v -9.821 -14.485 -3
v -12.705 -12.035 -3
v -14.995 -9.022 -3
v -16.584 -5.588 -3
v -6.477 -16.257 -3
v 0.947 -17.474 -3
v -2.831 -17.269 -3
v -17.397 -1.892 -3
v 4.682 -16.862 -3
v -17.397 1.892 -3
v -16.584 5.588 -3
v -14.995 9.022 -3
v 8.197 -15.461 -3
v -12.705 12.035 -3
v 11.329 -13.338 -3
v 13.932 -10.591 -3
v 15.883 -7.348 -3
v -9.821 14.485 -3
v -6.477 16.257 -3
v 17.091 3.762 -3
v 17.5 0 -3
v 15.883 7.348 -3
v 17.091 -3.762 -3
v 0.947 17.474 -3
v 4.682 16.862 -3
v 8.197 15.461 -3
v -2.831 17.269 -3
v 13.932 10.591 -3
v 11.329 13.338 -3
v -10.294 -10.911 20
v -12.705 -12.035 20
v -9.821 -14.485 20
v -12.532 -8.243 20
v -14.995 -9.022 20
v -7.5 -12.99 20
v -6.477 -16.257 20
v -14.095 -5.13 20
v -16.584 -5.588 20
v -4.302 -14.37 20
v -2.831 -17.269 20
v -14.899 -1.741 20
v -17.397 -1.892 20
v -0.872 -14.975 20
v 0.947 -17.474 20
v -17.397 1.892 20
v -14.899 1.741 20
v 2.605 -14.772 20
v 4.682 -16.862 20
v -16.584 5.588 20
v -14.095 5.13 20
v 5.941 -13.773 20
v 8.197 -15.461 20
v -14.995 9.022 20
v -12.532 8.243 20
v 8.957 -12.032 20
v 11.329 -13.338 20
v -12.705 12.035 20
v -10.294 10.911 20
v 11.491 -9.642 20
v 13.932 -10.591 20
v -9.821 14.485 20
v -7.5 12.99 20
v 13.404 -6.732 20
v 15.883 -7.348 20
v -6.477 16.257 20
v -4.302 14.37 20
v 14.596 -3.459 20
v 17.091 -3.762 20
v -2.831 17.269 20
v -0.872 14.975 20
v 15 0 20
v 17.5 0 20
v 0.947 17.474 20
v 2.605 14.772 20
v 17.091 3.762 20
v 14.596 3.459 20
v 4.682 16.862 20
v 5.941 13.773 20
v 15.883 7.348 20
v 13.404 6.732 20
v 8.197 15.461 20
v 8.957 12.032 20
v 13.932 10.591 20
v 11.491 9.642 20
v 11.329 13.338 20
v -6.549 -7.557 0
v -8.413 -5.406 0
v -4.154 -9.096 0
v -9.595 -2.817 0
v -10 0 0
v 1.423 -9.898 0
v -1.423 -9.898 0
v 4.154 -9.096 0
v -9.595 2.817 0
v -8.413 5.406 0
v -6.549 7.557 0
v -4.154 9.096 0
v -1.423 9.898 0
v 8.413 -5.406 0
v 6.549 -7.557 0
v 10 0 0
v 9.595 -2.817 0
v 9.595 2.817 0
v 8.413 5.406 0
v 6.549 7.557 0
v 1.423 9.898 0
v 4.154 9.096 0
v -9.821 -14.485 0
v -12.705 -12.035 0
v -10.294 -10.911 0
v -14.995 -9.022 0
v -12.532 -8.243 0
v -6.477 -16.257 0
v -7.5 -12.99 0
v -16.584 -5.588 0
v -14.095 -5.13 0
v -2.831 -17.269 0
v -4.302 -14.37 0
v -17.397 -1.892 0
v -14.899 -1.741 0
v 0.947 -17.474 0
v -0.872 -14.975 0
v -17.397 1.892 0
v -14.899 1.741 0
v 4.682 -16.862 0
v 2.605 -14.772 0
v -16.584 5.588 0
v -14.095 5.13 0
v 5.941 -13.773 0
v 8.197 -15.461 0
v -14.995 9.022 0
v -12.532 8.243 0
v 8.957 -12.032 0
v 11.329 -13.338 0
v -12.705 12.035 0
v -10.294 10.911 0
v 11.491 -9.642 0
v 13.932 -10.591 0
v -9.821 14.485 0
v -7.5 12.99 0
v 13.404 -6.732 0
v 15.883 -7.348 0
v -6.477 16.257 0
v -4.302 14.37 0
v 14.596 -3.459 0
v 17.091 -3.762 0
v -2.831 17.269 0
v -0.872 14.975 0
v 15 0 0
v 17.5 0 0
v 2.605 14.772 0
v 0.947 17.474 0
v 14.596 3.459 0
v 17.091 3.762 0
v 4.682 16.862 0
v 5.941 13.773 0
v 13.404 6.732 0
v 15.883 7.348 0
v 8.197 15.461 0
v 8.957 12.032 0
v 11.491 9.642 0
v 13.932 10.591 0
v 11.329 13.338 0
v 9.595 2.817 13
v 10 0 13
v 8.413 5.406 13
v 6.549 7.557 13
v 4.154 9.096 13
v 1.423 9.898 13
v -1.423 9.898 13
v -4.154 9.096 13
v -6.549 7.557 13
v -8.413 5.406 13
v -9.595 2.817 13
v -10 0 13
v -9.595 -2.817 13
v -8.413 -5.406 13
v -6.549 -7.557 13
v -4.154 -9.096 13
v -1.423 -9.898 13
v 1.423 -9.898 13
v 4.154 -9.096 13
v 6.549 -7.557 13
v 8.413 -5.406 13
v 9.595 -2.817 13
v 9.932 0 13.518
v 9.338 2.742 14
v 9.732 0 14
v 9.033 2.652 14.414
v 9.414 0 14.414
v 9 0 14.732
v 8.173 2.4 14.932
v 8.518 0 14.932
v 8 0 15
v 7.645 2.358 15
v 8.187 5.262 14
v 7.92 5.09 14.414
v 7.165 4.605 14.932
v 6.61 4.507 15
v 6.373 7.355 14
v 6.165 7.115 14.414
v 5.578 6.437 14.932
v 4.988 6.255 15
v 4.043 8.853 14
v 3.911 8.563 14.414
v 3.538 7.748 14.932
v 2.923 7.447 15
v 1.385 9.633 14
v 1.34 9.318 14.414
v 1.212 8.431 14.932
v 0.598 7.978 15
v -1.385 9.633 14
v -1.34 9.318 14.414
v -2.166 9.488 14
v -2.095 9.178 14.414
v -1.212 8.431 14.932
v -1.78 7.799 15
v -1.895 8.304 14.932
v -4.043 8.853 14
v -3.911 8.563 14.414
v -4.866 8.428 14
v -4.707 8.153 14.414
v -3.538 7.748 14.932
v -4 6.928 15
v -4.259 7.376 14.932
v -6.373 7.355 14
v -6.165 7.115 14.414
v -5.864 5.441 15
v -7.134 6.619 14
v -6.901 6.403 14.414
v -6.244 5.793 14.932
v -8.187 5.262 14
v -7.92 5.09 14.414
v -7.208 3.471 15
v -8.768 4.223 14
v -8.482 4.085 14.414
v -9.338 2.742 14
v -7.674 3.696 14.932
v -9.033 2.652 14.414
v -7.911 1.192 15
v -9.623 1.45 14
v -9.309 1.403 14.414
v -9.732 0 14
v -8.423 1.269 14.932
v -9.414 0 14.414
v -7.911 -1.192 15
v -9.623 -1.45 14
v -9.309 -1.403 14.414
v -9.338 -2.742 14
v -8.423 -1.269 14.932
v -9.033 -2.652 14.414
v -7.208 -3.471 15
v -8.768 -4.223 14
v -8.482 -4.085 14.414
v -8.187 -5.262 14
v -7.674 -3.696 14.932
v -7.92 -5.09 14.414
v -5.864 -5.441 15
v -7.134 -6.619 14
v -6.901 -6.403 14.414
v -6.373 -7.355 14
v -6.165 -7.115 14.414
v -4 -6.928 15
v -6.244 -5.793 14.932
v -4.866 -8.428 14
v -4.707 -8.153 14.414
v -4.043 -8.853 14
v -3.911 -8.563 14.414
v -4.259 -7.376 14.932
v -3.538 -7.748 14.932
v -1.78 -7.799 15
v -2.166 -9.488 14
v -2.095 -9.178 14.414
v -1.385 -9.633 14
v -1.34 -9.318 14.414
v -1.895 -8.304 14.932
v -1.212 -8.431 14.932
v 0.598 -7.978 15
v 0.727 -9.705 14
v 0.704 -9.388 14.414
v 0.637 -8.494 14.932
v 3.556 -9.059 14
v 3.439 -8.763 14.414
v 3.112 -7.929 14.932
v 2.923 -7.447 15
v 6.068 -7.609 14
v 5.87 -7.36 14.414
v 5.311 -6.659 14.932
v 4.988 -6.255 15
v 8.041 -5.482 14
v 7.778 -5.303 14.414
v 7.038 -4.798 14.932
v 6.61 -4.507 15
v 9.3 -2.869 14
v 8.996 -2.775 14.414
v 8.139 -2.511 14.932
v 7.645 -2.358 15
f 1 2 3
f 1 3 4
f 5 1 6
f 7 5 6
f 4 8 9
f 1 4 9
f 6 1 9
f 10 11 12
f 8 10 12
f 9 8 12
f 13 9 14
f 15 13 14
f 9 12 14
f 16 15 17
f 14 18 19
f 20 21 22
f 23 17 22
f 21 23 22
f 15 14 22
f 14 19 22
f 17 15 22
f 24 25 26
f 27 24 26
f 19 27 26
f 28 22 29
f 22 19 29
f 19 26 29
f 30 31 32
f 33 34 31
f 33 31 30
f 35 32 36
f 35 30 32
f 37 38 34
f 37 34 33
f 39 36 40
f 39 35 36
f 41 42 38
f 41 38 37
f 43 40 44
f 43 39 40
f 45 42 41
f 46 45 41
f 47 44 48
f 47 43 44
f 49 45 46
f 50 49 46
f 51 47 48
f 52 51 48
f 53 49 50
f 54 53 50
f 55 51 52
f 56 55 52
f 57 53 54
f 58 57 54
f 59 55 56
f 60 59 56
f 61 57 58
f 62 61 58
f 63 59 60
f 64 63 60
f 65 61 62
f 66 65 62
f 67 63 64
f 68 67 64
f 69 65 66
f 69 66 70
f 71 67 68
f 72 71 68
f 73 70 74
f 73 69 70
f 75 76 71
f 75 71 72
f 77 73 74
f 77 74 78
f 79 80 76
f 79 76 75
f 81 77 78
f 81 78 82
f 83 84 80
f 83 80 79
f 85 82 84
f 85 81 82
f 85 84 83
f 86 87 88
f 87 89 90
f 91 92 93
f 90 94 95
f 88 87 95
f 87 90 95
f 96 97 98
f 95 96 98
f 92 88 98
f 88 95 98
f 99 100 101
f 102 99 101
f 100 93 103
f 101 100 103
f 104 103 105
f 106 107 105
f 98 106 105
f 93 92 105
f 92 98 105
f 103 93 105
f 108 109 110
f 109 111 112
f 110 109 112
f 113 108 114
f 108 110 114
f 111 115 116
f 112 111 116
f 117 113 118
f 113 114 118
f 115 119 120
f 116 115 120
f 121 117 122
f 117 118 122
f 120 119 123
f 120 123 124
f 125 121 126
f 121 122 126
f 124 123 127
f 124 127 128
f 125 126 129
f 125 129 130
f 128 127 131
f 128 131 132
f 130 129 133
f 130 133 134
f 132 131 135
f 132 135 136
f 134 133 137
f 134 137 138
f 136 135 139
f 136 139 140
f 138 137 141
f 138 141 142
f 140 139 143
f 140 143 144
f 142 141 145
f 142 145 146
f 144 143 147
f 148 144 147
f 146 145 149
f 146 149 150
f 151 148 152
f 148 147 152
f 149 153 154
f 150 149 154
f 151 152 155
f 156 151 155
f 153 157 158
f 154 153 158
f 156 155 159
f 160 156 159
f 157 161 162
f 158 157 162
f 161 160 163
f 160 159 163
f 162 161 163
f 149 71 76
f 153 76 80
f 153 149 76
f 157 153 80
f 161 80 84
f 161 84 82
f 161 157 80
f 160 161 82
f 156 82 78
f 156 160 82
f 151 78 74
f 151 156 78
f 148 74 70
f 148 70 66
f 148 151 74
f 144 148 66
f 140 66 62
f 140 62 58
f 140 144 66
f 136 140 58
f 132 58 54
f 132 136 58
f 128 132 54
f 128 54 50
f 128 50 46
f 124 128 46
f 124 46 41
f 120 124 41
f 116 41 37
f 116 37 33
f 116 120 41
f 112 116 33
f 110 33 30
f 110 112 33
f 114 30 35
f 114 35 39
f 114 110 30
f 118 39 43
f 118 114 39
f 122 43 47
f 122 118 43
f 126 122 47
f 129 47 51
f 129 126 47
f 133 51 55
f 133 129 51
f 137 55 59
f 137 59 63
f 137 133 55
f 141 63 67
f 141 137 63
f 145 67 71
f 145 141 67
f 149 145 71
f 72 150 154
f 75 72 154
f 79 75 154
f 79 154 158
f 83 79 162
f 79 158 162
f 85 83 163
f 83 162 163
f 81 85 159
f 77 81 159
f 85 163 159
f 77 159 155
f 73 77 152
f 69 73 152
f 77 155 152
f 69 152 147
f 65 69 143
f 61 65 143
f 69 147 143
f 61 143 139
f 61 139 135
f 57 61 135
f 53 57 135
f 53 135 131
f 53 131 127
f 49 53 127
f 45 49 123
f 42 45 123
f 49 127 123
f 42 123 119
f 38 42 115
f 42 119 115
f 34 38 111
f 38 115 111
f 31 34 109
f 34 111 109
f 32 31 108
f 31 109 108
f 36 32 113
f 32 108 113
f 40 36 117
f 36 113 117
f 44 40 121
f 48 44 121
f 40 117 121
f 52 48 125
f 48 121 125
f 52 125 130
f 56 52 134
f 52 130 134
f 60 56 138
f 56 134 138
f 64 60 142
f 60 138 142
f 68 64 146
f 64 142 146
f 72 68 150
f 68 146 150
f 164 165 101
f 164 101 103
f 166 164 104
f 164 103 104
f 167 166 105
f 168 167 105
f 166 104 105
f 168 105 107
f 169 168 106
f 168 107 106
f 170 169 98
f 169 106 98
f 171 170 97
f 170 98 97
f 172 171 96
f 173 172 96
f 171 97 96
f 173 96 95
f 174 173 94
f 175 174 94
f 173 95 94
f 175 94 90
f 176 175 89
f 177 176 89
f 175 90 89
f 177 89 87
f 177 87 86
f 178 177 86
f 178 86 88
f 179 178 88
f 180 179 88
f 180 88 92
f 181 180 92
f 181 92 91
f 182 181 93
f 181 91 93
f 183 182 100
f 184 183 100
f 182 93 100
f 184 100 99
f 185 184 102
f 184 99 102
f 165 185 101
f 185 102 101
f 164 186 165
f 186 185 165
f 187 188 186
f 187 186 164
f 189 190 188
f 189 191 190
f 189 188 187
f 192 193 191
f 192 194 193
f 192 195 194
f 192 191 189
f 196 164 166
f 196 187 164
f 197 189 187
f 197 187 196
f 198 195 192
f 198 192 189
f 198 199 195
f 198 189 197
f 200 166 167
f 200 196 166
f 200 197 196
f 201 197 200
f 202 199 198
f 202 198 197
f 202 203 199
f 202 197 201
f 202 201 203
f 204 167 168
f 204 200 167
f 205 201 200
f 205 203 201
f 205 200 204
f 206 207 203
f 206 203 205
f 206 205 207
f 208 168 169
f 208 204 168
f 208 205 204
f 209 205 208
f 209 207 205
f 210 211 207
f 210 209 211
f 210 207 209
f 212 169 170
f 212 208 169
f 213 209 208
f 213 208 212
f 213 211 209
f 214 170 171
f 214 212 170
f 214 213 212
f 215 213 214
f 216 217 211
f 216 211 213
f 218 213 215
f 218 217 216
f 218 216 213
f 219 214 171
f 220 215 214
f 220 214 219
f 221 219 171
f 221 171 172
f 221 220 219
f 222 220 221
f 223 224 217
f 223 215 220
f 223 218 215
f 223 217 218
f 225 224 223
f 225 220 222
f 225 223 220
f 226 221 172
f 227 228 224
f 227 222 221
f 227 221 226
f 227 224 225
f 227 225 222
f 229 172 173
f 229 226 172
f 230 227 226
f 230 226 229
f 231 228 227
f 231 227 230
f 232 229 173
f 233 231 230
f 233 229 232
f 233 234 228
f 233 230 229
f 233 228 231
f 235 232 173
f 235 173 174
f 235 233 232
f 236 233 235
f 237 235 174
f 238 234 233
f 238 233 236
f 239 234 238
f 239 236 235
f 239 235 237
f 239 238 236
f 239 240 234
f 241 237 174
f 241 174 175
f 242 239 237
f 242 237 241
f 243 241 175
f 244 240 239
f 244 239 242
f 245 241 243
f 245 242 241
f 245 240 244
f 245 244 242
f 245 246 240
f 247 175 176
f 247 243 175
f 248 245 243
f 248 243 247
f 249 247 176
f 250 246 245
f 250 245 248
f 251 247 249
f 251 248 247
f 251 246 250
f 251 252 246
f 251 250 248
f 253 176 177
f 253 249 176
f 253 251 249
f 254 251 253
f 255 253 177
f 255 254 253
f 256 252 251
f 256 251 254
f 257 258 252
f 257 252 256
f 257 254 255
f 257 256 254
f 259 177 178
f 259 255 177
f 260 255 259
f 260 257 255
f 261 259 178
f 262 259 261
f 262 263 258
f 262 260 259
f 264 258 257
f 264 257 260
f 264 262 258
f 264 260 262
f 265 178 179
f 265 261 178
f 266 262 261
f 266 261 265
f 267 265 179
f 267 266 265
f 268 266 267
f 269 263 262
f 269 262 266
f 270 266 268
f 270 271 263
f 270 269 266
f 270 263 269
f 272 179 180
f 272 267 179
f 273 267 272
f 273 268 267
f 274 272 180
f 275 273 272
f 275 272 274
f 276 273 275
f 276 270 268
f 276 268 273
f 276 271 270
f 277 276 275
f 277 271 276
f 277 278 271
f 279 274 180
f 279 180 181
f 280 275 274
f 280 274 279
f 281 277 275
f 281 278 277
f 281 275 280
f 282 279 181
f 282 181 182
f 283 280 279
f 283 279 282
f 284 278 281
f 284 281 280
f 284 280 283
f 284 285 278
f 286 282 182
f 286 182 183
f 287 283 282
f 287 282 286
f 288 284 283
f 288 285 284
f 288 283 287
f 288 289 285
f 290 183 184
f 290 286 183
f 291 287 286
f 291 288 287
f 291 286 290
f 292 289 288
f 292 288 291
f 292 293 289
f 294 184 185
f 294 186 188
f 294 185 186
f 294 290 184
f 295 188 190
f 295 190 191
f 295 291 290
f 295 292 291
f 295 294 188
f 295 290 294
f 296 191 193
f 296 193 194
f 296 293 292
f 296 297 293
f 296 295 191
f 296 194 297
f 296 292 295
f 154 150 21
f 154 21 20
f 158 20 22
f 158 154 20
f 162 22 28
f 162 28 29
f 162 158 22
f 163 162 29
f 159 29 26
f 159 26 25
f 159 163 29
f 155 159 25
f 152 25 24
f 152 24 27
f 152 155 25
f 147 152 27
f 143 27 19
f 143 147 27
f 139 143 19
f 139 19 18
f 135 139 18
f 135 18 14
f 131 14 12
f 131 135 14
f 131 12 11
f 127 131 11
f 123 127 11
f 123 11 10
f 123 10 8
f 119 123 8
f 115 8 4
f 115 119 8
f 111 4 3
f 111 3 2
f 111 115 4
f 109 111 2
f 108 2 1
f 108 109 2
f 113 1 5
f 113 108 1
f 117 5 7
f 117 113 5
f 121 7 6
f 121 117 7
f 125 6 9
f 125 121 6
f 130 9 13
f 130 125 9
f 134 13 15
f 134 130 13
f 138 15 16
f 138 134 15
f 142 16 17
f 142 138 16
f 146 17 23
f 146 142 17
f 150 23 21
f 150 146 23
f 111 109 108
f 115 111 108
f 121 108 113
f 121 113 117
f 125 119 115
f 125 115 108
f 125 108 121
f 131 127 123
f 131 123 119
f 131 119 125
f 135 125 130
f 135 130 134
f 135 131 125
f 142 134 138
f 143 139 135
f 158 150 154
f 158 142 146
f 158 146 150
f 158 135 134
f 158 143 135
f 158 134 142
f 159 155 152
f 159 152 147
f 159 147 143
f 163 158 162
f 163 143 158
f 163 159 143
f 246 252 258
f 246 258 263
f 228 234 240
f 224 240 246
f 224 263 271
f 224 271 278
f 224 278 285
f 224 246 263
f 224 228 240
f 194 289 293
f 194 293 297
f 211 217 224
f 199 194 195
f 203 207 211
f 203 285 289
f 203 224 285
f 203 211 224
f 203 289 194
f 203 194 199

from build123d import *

# Parameters (mm, degrees)
F0_R     = 17.5
F0_R_2   = 15
F1_DEPTH = 20
F2_R     = 10
F3_DEPTH = 15
F4_R     = 17.5
F5_DEPTH = 3
F6_R     = 2


with BuildPart() as f1:
    # F0 (on Top) → F1 (new body)
    with BuildSketch(Plane.XY):
        Circle(F0_R)
        Circle(F0_R_2, mode=Mode.SUBTRACT)
    extrude(amount=F1_DEPTH)


with BuildPart() as f3:
    # F2 (on Top) → F3 (new body)
    with BuildSketch(Plane.XY):
        Circle(F2_R)
    extrude(amount=F3_DEPTH)

    # F6
    f6_edges = [f3.edges().sort_by_distance(p)[0] for p in [
        (-10, 0, 15),
    ]]
    fillet(f6_edges, radius=F6_R)


with BuildPart() as f5:
    # F4 (on Top) → F5 (new body)
    with BuildSketch(Plane.XY):
        Circle(F4_R)
    extrude(amount=-F5_DEPTH)


solid = Compound([f1.part, f3.part, f5.part])
